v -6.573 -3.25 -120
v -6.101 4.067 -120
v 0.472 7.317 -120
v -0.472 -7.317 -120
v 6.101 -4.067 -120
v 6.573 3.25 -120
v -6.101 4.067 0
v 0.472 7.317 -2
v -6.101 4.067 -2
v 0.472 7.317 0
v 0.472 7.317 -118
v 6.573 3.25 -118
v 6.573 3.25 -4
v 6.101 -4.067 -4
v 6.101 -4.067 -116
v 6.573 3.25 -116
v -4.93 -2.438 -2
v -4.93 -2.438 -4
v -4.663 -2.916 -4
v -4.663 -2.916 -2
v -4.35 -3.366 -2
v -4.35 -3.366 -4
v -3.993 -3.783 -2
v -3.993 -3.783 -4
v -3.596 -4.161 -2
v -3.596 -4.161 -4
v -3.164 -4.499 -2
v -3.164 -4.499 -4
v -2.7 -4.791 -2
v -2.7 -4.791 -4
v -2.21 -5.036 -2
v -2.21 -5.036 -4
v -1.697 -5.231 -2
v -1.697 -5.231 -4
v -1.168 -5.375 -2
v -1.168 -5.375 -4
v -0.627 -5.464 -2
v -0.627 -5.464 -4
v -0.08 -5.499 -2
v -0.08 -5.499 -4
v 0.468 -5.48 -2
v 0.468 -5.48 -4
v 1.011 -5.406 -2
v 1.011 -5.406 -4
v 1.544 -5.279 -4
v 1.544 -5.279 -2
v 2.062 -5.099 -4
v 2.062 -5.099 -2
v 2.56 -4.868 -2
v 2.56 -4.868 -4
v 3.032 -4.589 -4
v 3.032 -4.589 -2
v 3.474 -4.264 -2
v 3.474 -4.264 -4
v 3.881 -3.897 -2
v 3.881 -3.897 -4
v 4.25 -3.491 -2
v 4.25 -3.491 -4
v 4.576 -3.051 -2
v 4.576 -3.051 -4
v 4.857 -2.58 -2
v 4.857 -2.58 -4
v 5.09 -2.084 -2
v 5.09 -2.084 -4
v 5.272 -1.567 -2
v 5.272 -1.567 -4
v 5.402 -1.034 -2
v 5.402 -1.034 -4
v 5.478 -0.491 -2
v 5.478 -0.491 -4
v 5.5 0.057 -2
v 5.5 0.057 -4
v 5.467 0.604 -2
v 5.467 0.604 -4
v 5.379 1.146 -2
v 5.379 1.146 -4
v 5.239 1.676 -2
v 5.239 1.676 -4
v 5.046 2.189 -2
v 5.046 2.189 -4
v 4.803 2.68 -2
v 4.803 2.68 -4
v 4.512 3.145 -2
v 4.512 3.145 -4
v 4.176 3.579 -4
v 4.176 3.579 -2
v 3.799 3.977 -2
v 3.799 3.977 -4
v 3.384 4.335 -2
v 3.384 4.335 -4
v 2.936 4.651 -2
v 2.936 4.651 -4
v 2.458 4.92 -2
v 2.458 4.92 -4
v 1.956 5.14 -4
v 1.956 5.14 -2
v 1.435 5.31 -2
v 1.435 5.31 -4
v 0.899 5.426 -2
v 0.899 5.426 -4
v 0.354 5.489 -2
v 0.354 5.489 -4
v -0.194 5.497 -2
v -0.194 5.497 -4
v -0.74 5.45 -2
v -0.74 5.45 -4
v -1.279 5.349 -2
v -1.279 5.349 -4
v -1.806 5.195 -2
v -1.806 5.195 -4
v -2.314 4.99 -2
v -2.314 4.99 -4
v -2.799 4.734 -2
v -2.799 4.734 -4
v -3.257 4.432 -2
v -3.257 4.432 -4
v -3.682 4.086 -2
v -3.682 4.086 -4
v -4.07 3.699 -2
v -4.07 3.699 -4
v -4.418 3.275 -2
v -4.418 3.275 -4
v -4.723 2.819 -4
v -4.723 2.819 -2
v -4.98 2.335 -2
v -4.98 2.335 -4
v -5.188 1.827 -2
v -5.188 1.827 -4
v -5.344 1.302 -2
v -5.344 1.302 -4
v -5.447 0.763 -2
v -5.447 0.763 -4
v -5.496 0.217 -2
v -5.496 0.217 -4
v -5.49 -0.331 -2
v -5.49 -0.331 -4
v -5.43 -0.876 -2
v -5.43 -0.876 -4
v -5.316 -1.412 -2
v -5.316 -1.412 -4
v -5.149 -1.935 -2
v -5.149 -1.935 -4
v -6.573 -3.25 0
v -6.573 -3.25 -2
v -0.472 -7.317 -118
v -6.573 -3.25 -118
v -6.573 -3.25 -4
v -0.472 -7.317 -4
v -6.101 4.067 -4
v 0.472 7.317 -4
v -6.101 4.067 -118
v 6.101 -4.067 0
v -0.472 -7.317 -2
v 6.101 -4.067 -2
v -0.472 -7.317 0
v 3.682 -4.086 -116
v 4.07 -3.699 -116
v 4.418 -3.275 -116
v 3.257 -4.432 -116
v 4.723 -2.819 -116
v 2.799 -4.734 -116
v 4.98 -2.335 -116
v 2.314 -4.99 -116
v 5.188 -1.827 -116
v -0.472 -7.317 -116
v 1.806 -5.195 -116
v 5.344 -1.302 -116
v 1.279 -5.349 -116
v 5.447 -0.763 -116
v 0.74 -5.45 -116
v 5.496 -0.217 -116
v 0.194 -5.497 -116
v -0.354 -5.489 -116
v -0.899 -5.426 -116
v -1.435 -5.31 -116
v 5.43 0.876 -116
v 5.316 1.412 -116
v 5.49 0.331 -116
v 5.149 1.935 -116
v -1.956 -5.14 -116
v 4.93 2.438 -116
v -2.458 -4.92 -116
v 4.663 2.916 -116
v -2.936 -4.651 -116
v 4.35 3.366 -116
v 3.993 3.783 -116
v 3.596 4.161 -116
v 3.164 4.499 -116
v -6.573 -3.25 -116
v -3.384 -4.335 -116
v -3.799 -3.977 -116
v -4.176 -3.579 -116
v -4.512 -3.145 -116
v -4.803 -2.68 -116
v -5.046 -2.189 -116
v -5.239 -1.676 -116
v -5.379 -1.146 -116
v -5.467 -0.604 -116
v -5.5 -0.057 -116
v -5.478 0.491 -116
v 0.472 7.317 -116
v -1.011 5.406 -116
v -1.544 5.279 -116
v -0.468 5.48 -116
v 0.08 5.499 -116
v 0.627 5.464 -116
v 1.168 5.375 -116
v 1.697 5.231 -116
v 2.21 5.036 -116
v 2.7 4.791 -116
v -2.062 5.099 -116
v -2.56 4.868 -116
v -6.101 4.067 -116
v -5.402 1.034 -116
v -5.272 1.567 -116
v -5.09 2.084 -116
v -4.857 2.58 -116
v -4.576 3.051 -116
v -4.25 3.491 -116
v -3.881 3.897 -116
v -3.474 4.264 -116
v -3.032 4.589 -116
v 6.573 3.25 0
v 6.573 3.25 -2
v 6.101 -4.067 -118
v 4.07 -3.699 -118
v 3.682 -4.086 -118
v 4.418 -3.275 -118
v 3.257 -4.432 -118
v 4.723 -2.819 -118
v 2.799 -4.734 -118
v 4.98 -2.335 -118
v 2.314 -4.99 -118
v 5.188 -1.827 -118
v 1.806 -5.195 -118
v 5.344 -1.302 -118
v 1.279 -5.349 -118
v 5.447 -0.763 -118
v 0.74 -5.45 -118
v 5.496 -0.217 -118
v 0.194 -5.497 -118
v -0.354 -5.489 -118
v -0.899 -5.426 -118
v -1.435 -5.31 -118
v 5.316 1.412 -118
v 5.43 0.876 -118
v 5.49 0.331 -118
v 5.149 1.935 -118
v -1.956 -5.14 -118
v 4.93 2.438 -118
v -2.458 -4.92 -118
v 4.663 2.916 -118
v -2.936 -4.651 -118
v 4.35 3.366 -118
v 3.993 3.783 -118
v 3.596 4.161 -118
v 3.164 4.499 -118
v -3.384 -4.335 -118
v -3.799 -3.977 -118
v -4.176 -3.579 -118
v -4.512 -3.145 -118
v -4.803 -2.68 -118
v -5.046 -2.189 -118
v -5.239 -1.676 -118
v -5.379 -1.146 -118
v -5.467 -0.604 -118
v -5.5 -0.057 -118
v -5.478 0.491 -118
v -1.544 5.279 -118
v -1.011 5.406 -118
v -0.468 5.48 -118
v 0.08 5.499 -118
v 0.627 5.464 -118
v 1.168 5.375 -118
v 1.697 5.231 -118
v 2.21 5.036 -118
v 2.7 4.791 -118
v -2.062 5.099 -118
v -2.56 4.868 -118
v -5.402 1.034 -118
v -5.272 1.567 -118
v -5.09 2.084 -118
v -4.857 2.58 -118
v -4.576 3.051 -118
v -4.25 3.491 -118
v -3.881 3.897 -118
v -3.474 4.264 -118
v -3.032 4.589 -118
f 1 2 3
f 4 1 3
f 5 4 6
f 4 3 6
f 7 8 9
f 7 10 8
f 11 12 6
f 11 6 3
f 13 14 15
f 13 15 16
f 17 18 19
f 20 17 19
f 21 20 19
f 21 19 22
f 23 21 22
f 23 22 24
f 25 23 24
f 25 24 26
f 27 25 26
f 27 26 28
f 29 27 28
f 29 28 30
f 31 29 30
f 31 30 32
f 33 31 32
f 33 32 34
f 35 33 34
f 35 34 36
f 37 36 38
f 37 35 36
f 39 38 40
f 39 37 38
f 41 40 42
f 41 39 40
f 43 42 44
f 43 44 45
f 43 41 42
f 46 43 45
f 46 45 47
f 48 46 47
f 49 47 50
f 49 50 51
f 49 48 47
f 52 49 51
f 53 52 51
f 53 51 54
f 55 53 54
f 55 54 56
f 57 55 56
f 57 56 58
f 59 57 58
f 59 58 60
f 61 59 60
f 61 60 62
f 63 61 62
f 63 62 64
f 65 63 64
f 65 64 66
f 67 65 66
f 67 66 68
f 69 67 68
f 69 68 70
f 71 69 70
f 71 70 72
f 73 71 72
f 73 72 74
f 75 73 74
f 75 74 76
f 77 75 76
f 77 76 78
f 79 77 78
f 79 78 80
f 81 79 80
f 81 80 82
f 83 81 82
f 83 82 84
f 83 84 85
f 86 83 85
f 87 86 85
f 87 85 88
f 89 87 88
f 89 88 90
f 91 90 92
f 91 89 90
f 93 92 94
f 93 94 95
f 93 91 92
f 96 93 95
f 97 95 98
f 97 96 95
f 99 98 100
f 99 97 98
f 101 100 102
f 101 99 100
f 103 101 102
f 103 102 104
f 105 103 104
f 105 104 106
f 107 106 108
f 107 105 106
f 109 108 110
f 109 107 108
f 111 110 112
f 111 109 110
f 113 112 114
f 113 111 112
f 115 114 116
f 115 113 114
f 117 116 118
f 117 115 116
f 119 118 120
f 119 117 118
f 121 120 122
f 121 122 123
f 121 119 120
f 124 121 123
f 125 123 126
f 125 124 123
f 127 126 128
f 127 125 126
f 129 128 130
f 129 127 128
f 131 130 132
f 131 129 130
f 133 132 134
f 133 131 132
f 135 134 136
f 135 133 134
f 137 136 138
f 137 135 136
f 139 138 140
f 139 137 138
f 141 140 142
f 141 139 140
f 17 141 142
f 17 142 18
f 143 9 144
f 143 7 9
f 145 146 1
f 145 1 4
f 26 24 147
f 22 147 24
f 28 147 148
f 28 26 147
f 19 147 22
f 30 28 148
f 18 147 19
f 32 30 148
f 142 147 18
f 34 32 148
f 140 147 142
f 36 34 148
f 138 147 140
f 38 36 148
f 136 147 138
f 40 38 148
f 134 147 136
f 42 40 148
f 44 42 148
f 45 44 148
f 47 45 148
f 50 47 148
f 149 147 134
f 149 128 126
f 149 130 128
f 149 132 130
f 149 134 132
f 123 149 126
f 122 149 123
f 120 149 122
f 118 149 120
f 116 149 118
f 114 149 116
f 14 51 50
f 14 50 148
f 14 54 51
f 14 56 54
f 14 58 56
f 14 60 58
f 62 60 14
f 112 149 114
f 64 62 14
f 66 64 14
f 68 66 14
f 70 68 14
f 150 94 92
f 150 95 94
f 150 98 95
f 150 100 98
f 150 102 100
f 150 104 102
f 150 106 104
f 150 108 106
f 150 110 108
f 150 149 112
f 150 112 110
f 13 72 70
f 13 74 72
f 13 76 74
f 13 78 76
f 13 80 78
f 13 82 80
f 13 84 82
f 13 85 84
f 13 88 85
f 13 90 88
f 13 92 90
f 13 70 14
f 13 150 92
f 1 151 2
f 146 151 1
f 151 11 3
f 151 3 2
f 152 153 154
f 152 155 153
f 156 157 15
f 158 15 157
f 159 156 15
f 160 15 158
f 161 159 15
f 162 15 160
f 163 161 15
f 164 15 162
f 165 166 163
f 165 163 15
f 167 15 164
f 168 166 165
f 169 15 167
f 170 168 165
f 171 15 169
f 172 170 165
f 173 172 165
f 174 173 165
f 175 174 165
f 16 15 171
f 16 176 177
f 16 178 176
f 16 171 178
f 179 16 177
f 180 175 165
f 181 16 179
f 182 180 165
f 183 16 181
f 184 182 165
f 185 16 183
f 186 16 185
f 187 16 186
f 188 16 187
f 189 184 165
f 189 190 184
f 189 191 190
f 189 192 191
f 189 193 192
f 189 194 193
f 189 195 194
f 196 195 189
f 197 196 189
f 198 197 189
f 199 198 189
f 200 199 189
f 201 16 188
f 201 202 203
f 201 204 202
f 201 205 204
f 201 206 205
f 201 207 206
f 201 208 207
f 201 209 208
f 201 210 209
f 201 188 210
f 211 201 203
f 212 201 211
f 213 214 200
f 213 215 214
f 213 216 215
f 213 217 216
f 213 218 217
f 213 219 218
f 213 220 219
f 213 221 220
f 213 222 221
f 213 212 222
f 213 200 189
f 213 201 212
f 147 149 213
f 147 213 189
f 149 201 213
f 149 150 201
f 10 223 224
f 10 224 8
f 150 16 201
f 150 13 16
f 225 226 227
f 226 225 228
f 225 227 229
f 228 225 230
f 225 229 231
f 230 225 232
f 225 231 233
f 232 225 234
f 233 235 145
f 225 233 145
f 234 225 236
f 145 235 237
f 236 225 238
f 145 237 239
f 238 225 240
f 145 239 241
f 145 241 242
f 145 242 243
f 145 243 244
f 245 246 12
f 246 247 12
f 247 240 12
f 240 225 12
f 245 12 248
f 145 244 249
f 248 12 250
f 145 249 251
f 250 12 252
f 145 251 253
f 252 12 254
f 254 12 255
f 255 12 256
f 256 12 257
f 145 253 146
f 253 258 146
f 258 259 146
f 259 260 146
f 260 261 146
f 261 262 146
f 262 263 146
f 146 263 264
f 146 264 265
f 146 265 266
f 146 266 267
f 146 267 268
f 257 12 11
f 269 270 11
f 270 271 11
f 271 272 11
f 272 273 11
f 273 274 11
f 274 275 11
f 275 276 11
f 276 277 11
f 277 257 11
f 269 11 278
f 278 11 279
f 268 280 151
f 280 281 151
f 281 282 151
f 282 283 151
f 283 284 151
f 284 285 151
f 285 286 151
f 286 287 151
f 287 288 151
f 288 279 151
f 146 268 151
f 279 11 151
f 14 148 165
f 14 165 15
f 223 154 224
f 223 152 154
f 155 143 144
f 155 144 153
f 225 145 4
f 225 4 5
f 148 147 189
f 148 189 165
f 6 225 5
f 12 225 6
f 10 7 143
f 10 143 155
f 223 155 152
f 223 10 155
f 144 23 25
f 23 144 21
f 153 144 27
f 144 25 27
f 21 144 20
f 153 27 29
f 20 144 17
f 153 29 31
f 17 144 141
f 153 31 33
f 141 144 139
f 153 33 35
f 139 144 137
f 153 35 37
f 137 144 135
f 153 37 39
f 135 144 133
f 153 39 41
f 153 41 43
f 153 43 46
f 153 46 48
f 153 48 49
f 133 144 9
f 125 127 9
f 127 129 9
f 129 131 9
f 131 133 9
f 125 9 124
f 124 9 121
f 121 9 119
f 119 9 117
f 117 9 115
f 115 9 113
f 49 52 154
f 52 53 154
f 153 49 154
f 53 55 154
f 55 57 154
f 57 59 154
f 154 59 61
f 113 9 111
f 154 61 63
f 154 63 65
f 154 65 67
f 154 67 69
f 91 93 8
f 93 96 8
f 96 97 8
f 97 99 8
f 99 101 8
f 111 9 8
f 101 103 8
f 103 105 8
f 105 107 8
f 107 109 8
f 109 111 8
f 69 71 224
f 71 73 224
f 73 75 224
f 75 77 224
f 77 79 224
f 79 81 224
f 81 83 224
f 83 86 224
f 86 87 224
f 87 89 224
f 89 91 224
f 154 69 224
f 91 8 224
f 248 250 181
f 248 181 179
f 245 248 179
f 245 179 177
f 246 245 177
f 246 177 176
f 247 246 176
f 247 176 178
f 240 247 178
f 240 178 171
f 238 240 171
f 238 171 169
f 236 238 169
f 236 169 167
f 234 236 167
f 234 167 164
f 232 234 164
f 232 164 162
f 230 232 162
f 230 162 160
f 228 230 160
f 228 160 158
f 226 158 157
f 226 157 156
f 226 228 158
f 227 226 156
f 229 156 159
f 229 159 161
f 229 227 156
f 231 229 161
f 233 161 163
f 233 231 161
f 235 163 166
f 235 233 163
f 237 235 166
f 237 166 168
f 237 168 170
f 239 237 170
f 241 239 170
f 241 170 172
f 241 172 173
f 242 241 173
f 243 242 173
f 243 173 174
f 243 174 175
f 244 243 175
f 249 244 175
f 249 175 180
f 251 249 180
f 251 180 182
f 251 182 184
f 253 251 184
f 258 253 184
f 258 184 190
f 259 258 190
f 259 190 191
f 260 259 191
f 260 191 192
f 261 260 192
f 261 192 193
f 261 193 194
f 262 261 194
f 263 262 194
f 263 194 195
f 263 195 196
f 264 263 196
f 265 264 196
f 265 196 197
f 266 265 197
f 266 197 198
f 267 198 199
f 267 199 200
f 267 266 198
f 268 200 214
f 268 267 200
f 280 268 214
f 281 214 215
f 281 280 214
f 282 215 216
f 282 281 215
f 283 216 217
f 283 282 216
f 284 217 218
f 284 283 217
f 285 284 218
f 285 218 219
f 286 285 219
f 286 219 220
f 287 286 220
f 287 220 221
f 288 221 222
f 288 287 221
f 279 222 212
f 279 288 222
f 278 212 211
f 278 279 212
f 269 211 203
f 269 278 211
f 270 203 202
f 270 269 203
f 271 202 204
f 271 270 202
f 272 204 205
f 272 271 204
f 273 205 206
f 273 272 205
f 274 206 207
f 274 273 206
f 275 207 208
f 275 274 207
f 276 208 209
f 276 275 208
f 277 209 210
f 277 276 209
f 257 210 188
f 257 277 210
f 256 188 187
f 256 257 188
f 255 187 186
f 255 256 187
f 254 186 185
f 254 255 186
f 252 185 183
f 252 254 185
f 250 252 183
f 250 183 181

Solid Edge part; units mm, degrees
sketch "Sketch1" plane through (0, 0, 0) normal (0, 0, 1) x (1, 0, 0)
  line L0 (-6.1009, 4.0673) -> (-6.5728, -3.2499)
  line L1 (-6.5728, -3.2499) -> (-0.4719, -7.3171)
  line L2 (-0.4719, -7.3171) -> (6.1009, -4.0673)
  line L3 (6.1009, -4.0673) -> (6.5728, 3.2499)
  line L4 (6.5728, 3.2499) -> (0.4719, 7.3171)
  line L5 (0.4719, 7.3171) -> (-6.1009, 4.0673)
extrude "Protrusion1" add sketch "Sketch1" against normal blind 120
sketch "Sketch2" plane through (0, 0, -2) normal (0, 0, 1) x (-0.8964, -0.4432, 0)
  circle A0 centre (0, 0) radius 5.5
  circle A1 centre (0, 0) radius 13.1424
extrude "ExtrudedCutout_1" cut sketch "Sketch2" against normal blind 2
sketch "Sketch3" plane through (0, 0, -118) normal (0, 0, -1) x (0.8964, 0.4432, 0)
  circle A0 centre (0, 0) radius 5.5
  circle A1 centre (0, 0) radius 13.1424
extrude "ExtrudedCutout_2" cut sketch "Sketch3" against normal blind 2
properties part number "BumbleB0452"
